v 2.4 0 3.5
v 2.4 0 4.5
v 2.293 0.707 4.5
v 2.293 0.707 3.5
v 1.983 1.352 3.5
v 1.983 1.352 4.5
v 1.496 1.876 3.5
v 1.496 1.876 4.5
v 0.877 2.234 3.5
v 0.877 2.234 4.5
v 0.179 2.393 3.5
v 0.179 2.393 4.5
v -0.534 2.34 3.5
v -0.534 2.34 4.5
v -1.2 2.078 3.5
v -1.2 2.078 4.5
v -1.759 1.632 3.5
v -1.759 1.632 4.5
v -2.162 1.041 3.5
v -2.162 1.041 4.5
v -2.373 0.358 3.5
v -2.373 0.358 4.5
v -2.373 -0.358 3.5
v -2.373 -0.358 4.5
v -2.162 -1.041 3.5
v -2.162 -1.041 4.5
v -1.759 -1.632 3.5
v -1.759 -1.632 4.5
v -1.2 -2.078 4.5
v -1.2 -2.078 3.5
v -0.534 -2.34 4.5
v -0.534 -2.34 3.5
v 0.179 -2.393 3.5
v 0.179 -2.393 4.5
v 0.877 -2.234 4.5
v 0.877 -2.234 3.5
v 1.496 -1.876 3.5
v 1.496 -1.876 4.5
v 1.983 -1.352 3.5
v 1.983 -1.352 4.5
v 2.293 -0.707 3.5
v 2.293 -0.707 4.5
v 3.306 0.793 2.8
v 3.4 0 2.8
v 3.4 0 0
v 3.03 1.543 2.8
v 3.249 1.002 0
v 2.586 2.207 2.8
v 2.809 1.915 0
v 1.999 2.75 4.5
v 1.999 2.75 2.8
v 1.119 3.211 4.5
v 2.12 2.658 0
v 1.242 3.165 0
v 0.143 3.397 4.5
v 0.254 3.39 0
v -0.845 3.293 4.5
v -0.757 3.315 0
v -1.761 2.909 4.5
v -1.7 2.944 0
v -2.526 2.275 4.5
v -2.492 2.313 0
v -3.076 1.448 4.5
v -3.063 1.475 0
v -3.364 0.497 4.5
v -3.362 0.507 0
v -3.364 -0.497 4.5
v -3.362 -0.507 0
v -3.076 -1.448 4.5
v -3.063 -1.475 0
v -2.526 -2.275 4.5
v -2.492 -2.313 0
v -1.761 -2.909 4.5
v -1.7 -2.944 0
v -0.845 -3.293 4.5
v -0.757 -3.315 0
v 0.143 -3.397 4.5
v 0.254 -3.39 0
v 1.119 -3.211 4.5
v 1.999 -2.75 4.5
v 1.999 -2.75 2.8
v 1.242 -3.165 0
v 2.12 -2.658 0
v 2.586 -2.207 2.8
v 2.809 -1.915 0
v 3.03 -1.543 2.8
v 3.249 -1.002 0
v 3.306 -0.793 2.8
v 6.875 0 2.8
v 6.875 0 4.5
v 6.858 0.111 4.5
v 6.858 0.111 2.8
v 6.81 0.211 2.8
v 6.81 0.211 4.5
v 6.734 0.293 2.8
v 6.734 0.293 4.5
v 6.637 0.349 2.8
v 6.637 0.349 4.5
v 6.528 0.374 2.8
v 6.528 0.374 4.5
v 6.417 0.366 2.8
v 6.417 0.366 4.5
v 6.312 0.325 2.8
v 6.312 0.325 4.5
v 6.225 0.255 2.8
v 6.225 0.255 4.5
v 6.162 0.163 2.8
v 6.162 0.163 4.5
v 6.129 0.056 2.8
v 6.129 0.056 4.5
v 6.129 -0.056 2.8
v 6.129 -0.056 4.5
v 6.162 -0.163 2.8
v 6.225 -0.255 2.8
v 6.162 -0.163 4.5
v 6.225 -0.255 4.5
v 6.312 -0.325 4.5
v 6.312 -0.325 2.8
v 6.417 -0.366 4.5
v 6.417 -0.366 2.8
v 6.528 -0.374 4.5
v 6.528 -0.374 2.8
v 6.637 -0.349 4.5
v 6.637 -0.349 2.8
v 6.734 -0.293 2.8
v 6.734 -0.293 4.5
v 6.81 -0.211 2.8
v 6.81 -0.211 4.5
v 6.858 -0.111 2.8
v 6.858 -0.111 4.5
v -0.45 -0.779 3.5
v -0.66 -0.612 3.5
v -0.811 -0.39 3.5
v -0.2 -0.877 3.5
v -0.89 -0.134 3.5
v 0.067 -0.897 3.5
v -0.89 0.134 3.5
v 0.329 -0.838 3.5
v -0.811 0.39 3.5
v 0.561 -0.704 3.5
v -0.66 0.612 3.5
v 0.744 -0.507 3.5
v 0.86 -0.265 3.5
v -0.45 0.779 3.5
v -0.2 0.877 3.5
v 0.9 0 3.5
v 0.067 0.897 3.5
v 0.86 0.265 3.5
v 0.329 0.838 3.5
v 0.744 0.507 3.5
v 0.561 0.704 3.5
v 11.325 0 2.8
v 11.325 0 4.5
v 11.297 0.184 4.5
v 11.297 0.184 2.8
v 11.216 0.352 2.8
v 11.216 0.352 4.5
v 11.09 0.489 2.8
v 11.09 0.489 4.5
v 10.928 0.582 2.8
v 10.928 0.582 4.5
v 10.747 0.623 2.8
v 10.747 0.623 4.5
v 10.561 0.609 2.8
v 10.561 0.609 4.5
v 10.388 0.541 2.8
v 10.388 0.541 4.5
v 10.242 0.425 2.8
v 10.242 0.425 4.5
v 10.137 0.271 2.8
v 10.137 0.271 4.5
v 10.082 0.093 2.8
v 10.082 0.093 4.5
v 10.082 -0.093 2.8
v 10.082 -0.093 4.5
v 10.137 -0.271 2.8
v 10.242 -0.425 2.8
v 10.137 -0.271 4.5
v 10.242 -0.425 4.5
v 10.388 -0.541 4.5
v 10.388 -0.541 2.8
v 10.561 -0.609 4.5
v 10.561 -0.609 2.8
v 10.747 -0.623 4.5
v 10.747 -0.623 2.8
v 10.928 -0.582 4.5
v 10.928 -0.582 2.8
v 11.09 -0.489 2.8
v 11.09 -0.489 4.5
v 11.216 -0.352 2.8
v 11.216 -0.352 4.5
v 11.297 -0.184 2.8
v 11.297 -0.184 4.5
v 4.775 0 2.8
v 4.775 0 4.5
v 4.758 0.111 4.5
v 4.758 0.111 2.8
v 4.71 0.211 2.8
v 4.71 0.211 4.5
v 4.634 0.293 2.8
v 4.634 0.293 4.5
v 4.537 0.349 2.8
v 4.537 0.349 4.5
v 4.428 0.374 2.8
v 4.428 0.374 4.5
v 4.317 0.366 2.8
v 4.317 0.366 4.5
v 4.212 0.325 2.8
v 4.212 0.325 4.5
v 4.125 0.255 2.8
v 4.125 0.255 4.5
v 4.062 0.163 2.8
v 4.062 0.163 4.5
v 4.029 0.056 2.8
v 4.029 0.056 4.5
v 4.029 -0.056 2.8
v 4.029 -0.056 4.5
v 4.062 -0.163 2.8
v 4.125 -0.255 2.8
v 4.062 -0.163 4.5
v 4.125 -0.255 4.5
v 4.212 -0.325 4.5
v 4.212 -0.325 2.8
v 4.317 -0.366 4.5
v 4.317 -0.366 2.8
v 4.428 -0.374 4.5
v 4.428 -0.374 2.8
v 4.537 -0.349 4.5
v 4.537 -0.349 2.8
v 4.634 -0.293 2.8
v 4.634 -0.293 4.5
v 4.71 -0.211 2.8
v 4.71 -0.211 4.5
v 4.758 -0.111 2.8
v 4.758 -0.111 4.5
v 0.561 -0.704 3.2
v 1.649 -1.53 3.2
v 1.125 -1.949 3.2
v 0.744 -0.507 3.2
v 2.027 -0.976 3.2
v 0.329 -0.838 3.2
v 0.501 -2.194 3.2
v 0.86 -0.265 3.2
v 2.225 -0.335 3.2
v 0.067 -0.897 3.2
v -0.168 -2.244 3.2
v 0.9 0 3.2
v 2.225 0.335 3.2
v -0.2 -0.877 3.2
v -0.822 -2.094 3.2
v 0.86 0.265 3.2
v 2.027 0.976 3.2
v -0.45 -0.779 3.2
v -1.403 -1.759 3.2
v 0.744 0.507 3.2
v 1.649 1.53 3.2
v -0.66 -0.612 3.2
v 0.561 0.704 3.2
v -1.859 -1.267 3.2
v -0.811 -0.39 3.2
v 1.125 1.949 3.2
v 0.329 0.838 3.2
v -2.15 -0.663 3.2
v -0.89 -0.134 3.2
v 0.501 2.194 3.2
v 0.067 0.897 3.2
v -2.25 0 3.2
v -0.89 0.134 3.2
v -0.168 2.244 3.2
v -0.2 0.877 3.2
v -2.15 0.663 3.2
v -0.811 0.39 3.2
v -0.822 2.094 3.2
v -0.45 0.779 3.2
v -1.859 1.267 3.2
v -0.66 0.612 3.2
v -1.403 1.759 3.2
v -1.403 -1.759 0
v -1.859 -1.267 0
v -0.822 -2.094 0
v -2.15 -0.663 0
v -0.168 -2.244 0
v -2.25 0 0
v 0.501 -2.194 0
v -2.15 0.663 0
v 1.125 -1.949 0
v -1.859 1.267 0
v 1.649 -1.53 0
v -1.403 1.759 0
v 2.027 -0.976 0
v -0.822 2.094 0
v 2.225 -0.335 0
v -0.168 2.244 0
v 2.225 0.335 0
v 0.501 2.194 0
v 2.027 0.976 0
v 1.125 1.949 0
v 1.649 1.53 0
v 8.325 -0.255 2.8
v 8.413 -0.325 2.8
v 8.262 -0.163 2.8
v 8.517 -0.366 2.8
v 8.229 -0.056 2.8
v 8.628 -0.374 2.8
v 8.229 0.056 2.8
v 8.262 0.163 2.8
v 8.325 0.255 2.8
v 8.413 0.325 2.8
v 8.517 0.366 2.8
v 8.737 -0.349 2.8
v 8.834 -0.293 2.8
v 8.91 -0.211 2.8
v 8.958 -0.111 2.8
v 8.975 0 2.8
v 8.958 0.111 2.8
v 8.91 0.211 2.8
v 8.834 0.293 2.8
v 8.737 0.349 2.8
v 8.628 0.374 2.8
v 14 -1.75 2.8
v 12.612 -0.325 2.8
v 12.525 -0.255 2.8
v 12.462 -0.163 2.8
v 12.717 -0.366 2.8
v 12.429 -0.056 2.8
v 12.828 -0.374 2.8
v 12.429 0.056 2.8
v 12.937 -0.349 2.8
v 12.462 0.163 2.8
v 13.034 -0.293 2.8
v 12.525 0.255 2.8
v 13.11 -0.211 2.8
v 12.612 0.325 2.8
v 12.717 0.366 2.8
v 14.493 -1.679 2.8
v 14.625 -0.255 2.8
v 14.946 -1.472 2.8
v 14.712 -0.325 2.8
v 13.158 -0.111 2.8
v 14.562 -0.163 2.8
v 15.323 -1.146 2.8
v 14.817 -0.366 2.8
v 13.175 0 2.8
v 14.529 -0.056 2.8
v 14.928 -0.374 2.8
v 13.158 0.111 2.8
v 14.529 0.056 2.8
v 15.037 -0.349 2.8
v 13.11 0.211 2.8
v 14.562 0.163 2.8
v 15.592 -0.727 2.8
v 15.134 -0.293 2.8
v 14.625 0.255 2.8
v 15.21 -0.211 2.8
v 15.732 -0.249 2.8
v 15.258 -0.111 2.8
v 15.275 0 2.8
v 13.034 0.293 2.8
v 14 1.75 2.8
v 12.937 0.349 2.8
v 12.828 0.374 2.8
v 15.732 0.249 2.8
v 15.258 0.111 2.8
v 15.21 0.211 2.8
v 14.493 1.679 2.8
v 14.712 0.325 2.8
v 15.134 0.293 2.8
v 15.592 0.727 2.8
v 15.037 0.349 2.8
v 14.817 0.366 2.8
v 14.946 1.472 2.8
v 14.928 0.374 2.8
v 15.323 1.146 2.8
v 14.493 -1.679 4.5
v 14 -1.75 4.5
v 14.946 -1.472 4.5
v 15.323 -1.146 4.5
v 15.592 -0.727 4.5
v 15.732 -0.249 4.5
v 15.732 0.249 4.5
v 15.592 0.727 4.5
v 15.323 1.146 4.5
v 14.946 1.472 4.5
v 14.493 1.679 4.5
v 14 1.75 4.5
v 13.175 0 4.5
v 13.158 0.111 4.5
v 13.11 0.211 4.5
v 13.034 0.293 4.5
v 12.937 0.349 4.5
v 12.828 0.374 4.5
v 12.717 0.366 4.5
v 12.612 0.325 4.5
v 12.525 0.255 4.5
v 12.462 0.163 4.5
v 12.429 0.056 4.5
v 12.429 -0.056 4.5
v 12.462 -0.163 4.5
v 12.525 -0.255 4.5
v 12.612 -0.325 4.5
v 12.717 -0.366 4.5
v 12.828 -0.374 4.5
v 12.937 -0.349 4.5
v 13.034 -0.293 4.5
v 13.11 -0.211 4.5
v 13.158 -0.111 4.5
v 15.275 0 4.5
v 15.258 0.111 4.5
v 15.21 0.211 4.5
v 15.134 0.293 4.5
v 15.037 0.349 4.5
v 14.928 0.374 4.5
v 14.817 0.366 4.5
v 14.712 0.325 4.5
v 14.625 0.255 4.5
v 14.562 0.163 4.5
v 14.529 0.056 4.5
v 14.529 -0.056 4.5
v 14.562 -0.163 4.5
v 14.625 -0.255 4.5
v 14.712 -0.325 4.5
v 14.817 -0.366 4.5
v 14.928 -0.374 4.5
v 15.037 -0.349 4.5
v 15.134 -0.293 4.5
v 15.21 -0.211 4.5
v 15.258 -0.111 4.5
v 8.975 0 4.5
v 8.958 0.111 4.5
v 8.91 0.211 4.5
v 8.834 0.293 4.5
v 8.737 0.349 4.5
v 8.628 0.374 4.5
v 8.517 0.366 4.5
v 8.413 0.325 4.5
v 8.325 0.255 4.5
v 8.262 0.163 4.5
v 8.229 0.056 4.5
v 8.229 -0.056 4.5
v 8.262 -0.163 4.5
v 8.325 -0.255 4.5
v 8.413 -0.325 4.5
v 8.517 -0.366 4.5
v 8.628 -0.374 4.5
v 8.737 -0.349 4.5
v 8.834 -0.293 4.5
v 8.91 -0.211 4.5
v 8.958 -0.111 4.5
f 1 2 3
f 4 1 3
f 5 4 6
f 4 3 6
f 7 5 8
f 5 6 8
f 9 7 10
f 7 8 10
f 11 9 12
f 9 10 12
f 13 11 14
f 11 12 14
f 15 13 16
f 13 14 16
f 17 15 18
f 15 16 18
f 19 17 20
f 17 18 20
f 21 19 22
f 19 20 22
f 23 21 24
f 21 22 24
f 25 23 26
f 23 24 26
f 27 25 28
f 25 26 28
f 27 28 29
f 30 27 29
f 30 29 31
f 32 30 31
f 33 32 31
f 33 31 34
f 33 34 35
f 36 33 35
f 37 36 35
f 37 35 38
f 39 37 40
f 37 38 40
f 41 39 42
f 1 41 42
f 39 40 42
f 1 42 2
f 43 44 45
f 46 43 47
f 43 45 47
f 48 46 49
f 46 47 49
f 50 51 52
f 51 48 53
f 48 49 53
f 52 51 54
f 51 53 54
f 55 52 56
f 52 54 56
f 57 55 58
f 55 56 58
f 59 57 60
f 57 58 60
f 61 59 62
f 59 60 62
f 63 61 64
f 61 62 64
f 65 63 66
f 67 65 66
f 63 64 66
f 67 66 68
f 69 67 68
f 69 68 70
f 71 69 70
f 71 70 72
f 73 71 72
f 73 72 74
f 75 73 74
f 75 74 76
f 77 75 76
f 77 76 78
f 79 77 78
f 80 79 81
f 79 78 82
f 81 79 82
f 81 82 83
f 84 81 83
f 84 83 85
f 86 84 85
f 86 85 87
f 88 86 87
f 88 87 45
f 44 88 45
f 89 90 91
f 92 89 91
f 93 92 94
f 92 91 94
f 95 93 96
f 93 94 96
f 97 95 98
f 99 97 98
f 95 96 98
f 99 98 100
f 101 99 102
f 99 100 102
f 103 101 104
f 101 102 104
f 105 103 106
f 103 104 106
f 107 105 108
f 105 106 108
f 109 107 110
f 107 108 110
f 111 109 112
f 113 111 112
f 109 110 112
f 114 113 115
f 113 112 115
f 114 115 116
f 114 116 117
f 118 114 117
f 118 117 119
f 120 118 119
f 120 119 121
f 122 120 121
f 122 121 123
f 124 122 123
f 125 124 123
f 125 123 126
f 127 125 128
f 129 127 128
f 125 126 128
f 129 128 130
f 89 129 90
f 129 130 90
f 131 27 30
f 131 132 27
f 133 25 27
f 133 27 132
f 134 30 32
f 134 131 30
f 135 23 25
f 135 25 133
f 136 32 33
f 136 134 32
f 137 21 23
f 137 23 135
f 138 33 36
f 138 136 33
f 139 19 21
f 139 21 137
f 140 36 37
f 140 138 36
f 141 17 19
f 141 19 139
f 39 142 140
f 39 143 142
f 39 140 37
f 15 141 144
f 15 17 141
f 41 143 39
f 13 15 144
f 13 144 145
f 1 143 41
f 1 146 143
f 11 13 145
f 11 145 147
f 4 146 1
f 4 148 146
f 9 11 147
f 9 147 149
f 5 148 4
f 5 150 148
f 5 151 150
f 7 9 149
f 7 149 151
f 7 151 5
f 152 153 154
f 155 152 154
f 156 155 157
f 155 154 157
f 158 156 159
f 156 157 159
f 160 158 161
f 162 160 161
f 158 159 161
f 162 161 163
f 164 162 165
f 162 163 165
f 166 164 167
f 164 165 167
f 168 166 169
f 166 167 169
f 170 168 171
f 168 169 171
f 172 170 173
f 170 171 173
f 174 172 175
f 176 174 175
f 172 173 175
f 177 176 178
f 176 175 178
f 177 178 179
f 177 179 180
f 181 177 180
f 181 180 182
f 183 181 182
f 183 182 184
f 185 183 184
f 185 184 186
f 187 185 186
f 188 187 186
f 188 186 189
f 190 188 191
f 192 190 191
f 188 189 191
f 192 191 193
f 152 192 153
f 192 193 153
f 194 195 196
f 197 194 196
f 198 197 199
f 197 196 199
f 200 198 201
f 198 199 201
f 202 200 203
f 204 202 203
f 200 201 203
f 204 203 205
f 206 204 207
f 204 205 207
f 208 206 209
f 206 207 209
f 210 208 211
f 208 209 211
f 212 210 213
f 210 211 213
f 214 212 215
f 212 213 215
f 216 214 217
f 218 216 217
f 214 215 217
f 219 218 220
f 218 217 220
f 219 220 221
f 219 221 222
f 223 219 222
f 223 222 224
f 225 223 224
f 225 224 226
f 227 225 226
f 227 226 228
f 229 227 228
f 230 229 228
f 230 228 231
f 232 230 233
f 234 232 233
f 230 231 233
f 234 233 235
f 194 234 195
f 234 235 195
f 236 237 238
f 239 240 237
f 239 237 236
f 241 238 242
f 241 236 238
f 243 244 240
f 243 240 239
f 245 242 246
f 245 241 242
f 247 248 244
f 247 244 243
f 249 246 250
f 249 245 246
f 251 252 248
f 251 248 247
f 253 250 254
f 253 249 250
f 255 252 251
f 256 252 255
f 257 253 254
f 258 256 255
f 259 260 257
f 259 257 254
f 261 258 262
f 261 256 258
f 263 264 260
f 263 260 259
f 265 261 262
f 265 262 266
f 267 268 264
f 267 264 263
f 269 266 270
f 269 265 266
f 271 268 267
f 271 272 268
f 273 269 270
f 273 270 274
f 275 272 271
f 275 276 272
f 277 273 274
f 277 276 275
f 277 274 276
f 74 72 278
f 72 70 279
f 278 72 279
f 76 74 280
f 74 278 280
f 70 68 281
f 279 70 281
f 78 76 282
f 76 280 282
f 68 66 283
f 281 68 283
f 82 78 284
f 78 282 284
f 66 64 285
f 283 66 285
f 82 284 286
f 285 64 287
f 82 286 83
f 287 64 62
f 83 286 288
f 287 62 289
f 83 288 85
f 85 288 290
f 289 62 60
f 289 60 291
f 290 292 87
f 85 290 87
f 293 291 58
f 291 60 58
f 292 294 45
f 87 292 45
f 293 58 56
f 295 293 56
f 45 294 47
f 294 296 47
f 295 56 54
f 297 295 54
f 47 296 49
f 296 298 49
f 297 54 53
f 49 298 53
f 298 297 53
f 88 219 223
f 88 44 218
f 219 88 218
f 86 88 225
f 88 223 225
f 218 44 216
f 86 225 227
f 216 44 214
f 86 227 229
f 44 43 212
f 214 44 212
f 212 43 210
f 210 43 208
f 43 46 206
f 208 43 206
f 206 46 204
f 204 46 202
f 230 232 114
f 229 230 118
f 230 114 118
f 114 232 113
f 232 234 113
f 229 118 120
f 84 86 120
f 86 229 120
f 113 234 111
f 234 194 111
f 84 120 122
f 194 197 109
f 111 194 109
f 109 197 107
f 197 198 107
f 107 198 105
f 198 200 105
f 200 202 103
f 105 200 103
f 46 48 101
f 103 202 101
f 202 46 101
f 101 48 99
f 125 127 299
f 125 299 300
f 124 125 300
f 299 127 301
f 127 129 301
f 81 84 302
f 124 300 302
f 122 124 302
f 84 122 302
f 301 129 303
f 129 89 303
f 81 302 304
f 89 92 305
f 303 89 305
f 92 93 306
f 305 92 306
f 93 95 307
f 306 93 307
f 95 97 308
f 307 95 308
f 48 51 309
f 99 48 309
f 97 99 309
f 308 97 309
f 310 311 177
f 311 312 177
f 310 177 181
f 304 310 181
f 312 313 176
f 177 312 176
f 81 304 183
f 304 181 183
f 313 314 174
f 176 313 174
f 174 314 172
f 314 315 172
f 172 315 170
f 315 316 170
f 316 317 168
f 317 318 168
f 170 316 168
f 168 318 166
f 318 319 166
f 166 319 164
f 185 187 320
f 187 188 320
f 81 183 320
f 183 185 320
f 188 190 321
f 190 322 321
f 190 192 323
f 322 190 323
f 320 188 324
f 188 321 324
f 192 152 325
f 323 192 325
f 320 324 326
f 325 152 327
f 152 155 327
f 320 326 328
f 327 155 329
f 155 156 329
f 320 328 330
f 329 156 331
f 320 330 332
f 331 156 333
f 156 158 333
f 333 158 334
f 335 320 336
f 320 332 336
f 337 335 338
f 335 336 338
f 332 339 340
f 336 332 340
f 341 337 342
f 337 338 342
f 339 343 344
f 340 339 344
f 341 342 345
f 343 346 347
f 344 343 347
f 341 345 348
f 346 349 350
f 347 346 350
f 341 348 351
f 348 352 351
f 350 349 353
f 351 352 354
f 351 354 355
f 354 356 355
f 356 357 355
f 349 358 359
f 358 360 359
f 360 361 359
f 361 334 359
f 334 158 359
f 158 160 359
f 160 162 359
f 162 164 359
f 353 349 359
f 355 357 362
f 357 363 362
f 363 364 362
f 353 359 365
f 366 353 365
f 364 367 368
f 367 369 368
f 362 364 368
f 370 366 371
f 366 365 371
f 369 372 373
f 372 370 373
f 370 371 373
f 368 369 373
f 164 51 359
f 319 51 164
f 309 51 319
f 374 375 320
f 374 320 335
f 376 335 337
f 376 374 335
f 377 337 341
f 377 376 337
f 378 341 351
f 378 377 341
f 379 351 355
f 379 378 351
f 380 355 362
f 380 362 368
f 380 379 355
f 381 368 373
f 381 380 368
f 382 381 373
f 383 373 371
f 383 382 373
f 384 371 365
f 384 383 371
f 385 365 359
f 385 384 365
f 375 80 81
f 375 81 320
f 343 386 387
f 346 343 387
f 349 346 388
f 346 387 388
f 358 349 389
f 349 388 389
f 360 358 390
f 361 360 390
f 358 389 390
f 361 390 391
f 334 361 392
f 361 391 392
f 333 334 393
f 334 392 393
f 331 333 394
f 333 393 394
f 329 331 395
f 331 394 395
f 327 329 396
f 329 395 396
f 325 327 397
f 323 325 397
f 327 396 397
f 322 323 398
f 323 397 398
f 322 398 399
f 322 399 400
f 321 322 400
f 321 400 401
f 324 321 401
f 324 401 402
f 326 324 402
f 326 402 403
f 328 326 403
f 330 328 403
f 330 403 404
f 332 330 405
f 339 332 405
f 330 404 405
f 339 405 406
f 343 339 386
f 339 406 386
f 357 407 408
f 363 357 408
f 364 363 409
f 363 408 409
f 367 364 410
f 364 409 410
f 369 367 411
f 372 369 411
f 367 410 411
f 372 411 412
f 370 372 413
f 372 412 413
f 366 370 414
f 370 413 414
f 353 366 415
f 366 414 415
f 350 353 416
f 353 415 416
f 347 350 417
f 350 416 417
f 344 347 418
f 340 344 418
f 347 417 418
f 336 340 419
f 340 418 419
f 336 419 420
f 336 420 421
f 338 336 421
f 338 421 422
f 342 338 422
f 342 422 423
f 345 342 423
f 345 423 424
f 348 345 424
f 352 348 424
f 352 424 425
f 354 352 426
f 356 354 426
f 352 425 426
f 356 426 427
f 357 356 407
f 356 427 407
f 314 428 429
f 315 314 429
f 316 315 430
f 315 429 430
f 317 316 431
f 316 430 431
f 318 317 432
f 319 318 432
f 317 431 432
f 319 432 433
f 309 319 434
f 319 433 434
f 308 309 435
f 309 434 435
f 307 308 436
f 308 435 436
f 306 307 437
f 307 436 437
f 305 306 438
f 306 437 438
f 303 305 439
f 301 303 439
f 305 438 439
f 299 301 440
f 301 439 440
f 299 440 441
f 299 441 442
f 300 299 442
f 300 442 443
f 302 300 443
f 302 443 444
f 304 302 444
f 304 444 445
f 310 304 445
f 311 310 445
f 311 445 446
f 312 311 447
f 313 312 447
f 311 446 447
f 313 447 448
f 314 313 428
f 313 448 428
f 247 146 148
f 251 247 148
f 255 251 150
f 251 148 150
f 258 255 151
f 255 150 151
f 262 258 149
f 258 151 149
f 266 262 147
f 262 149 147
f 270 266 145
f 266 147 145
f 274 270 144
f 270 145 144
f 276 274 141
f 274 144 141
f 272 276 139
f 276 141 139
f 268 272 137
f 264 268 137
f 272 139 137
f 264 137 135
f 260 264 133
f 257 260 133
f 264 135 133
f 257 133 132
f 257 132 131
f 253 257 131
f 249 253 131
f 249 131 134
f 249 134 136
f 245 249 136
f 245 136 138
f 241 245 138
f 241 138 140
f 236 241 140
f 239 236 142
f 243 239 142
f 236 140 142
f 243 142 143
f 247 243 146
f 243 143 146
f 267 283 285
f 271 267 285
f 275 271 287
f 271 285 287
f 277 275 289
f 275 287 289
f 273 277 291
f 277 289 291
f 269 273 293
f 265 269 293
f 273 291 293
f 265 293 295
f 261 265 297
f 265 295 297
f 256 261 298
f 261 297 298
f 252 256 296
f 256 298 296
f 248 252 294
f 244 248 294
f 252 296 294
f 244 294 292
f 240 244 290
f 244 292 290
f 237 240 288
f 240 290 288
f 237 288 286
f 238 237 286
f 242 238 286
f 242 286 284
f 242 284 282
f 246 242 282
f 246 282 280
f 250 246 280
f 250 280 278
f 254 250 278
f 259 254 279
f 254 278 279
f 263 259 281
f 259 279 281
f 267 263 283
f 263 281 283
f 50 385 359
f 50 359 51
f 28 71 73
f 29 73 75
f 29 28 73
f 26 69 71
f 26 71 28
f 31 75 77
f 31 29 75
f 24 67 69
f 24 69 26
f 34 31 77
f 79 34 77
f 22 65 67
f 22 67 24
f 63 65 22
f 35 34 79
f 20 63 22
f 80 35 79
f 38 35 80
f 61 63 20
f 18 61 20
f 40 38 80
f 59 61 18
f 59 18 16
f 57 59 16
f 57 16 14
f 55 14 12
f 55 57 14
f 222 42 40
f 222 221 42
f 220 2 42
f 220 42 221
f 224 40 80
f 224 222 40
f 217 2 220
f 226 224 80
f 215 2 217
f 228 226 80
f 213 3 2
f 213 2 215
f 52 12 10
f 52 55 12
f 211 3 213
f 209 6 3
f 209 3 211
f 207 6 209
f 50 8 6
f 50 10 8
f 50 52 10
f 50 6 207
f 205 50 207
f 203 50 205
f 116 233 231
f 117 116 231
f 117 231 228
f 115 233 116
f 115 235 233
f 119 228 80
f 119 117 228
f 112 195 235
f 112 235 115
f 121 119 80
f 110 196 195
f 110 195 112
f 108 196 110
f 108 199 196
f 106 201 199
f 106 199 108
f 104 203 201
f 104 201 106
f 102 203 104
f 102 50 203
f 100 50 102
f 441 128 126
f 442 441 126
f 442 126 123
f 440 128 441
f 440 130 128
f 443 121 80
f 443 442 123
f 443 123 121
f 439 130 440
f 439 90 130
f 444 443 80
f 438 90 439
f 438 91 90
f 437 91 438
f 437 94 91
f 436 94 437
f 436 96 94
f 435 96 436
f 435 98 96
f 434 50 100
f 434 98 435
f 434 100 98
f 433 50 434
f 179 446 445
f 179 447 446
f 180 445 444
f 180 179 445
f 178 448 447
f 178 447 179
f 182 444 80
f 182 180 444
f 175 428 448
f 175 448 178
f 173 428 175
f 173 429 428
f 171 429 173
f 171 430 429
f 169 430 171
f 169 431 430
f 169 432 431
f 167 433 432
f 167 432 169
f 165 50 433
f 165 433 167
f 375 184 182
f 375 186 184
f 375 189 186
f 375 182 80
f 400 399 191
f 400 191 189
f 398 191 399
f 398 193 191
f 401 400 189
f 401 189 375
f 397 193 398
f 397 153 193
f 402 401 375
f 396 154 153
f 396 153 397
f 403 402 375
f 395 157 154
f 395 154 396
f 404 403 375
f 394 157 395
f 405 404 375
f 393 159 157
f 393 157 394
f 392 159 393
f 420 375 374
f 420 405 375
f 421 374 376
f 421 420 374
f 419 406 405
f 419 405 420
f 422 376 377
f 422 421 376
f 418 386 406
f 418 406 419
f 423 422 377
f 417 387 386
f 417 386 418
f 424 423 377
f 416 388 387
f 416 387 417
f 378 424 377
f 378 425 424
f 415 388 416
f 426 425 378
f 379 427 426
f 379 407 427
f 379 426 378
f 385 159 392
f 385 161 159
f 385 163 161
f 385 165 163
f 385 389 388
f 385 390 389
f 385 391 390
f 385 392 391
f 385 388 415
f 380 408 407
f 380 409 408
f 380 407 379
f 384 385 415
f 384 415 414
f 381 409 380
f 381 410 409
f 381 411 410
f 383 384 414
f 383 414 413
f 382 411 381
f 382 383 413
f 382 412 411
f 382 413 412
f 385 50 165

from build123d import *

# Parameters (mm, degrees)
SKICA1_R                 = 3.4
P_IDAT_VYSUNUT_M1_DEPTH  = 4.5
SKICA2_R                 = 2.25
ODEBRAT_VYSUNUT_M1_DEPTH = 3.2
SKICA3_R                 = 2.4
ODEBRAT_VYSUNUT_M2_DEPTH = 1
SKICA4_R                 = 0.9
ODEBRAT_VYSUNUT_M3_DEPTH = 0.3
P_IDAT_VYSUNUT_M2_DEPTH  = 1.7
SKICA6_R                 = 0.375
ODEBRAT_VYSUNUT_M4_DEPTH = 1.7
LINPOLE1_COUNT           = 6
LINPOLE1_PITCH           = 2.1
SKICA7_R                 = 0.625
ODEBRAT_VYSUNUT_M5_DEPTH = 1.7


with BuildPart() as part:
    # Skica1 → Přidat vysunutím1 (new body)
    with BuildSketch(Plane.XY):
        Circle(SKICA1_R)
    extrude(amount=P_IDAT_VYSUNUT_M1_DEPTH)

    # Skica2 → Odebrat vysunutím1 (cut)
    with BuildSketch(Plane(origin=(0, 0, 0), x_dir=(-1, 0, 0), z_dir=(0, 0, -1))):
        Circle(SKICA2_R)
    extrude(amount=-ODEBRAT_VYSUNUT_M1_DEPTH, mode=Mode.SUBTRACT)

    # Skica3 → Odebrat vysunutím2 (cut)
    with BuildSketch(Plane.XY.offset(4.5)):
        Circle(SKICA3_R)
    extrude(amount=-ODEBRAT_VYSUNUT_M2_DEPTH, mode=Mode.SUBTRACT)

    # Skica4 → Odebrat vysunutím3 (cut)
    with BuildSketch(Plane.XY.offset(3.5)):
        Circle(SKICA4_R)
    extrude(amount=-ODEBRAT_VYSUNUT_M3_DEPTH, mode=Mode.SUBTRACT)

    # Skica5 → Přidat vysunutím2 (add)
    with BuildSketch(Plane.XY.offset(4.5)):
        with BuildLine():
            Line((1.999374902, -2.75), (14, -1.75))
            ThreePointArc((14, -1.75), (15.75, 0), (14, 1.75))
            Line((14, 1.75), (1.999374902, 2.75))
            ThreePointArc((1.999374902, 2.75), (3.4, 0), (1.999374902, -2.75))
        make_face()
    extrude(amount=-P_IDAT_VYSUNUT_M2_DEPTH)

    # Skica6 → Odebrat vysunutím4 (cut)
    with BuildSketch(Plane.XY.offset(4.5)):
        with Locations((4.4, 0)):
            Circle(SKICA6_R)
    odebrat_vysunut_m4 = extrude(amount=-ODEBRAT_VYSUNUT_M4_DEPTH, mode=Mode.SUBTRACT)

    # LinPole1: Odebrat vysunutím4 ×6
    with Locations(*[(i * LINPOLE1_PITCH, 0, 0) for i in range(1, LINPOLE1_COUNT)]):
        add(odebrat_vysunut_m4, mode=Mode.SUBTRACT)

    # Skica7 → Odebrat vysunutím5 (cut)
    with BuildSketch(Plane.XY.offset(4.5)):
        with Locations((10.7, 0)):
            Circle(SKICA7_R)
    extrude(amount=-ODEBRAT_VYSUNUT_M5_DEPTH, mode=Mode.SUBTRACT)


solid = part.part
